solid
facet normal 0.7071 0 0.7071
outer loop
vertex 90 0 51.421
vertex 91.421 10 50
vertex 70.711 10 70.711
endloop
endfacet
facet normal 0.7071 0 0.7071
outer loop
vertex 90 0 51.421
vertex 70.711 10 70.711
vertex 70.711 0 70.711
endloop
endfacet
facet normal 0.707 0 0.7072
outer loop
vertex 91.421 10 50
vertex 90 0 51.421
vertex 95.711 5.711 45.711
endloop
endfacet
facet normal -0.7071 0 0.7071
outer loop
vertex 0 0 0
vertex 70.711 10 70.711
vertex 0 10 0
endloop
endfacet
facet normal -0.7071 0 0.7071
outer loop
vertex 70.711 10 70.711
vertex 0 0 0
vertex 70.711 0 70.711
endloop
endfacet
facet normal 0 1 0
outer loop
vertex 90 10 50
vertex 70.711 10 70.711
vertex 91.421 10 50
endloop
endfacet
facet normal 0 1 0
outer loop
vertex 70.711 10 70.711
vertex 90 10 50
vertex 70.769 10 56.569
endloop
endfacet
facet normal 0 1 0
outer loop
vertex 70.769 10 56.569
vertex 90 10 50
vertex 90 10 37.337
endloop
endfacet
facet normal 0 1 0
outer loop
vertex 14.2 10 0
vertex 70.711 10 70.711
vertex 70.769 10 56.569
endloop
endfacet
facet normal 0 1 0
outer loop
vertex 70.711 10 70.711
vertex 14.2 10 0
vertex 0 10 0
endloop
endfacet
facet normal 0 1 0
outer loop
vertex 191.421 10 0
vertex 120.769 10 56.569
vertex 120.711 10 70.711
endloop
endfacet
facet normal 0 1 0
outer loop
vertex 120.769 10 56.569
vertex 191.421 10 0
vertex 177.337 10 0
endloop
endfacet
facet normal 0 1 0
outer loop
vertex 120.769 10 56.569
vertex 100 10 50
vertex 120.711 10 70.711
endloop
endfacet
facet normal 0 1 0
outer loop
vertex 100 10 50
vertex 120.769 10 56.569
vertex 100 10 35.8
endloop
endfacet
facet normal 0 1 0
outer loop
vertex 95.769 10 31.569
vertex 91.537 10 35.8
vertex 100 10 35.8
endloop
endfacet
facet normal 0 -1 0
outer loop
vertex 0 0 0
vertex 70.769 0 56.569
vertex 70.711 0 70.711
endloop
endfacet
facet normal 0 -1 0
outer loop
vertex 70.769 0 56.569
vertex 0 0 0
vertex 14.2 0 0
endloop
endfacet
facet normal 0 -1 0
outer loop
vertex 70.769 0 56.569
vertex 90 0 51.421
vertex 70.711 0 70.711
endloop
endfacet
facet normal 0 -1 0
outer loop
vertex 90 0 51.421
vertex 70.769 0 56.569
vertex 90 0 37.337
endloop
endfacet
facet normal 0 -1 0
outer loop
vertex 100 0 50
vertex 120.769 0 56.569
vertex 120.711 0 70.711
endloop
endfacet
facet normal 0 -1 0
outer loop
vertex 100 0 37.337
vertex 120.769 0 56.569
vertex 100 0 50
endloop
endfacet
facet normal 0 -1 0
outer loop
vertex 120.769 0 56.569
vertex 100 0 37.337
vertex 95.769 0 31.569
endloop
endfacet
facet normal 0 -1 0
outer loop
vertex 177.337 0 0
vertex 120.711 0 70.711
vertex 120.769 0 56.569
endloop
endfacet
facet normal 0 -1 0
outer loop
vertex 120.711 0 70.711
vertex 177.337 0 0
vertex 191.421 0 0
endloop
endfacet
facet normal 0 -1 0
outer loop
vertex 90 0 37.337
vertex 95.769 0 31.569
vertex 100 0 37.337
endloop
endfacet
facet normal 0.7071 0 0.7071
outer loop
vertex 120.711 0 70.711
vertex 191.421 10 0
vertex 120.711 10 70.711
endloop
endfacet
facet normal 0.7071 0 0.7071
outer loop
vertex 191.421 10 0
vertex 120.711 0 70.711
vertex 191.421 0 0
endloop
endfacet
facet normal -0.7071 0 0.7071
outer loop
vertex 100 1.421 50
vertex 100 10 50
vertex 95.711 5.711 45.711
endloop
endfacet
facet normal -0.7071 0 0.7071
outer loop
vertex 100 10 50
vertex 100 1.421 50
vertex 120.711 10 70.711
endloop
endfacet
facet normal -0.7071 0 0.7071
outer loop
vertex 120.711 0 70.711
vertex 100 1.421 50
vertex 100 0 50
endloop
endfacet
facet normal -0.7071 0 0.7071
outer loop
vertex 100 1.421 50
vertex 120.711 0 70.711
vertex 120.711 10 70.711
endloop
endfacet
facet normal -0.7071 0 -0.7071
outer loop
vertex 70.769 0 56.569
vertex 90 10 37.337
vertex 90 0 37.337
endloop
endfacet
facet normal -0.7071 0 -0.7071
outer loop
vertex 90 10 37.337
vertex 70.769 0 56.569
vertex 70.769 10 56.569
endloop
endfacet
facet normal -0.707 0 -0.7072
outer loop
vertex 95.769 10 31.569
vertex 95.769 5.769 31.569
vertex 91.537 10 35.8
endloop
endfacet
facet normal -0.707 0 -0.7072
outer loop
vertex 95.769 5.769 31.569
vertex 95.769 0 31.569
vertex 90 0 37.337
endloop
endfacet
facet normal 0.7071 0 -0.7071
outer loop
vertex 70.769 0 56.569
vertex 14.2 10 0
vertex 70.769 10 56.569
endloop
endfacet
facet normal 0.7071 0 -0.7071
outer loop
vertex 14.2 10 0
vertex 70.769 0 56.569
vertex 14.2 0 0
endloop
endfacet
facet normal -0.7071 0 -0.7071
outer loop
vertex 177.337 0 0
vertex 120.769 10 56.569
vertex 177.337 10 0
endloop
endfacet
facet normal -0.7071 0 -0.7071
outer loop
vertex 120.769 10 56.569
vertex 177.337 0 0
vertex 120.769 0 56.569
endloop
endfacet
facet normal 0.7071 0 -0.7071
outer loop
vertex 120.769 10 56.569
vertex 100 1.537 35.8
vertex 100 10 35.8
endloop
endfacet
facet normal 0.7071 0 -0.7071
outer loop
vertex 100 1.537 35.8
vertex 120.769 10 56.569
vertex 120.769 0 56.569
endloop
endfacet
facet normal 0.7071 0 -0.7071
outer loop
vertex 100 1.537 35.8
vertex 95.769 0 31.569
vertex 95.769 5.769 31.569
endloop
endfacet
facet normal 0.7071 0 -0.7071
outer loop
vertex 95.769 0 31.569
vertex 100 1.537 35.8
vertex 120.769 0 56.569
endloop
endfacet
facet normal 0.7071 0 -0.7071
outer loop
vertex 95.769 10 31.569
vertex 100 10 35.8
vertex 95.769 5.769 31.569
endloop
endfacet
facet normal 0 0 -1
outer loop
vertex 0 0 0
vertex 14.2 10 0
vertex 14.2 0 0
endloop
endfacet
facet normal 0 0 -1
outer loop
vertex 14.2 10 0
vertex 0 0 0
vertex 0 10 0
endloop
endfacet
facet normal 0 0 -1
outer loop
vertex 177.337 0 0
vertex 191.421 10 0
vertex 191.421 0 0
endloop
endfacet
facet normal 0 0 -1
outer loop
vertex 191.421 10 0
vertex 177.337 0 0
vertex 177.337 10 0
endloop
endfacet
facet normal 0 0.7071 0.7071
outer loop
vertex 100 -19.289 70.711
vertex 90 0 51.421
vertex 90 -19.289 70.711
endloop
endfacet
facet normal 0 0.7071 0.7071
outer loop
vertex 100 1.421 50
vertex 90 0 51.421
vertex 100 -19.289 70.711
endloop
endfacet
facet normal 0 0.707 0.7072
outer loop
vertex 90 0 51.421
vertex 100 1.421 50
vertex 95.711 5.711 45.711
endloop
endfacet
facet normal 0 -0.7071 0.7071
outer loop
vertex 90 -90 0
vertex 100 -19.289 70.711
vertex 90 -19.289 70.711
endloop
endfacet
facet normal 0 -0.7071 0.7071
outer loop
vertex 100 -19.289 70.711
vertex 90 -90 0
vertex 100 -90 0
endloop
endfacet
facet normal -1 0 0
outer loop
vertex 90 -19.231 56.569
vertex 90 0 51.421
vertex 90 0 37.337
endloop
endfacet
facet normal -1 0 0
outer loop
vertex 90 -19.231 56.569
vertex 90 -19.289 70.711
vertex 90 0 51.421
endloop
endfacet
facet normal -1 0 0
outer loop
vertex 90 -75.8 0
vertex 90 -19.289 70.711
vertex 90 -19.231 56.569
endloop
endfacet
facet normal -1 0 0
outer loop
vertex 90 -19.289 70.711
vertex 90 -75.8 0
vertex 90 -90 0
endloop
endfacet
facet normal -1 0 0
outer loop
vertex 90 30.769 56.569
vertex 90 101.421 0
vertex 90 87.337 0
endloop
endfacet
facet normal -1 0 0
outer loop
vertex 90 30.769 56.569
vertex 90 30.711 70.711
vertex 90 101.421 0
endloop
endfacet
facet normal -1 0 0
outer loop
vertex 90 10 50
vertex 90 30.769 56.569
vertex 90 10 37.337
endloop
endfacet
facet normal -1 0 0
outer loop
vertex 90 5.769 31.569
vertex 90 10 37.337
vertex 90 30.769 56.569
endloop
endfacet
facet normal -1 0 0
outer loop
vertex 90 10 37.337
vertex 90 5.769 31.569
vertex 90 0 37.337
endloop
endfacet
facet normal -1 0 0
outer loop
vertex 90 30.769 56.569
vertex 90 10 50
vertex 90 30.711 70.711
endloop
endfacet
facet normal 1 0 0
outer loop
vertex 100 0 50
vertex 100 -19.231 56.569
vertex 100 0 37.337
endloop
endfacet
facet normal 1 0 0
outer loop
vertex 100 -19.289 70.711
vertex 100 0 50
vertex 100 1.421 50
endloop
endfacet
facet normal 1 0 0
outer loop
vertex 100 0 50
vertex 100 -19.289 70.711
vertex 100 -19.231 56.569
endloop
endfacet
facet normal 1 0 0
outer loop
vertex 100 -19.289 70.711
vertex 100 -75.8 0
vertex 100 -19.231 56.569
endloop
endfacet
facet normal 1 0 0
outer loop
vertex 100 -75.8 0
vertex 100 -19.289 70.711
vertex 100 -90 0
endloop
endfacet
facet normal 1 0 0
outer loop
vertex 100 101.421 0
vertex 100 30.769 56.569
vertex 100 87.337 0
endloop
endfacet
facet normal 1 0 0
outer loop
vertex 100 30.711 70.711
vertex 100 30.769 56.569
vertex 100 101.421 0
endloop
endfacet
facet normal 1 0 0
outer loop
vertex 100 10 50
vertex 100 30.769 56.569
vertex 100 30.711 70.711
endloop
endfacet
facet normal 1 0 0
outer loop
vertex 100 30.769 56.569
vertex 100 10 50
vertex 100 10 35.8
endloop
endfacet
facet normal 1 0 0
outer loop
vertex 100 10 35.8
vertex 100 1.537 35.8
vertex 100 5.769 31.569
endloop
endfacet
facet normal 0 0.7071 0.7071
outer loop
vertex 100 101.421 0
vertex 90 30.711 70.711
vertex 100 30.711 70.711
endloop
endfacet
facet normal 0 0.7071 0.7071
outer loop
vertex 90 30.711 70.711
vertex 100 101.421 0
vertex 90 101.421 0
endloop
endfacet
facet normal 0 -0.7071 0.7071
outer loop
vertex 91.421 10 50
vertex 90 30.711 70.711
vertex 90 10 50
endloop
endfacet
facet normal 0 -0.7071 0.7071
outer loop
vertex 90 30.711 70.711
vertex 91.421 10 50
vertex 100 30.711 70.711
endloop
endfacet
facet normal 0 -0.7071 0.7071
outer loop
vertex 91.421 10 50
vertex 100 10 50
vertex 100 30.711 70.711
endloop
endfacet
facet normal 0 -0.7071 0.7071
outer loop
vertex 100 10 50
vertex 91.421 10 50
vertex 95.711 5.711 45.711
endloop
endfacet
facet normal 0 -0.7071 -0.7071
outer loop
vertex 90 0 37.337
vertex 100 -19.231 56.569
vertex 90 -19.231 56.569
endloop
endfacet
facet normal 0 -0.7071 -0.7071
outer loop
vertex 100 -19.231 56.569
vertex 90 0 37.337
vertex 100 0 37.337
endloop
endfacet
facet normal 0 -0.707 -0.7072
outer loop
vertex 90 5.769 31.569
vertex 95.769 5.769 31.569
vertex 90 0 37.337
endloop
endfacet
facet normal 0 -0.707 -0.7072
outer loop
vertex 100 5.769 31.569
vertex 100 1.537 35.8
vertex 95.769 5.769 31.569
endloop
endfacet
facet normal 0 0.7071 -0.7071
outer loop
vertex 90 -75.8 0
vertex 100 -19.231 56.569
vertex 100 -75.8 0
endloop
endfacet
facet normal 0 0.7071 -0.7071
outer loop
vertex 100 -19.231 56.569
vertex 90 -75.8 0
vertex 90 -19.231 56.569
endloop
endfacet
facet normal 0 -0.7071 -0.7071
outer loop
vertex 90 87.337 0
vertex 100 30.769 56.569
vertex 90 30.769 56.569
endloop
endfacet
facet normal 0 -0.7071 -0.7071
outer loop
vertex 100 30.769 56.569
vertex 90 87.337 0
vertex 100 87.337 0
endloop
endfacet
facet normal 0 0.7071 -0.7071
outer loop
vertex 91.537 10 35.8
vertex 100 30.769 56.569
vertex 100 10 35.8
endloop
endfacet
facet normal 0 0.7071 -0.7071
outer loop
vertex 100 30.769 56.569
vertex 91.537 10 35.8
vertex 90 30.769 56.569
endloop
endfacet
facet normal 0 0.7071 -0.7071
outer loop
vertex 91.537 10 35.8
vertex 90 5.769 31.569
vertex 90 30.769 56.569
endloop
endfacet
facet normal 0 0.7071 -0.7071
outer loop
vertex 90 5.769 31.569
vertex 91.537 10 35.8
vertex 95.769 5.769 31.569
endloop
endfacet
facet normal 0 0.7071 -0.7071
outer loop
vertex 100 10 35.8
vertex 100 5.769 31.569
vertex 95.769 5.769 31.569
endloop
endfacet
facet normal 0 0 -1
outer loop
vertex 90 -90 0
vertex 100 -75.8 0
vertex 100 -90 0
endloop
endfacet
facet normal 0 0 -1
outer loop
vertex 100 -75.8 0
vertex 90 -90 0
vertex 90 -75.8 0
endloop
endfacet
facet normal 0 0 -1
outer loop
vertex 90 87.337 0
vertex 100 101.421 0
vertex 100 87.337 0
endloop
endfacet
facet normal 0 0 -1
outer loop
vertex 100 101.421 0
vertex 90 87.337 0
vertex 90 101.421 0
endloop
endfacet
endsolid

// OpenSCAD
module m() {
    difference() {
        union() {
            rotate([0,45,0]) cube([100,10,100]);
            translate([50,0,0]) rotate([0,45,0]) cube([100,10,100]);
        }
        union() {
            translate([14.2,0,0]) rotate([0,45,0]) cube([80,10,80]);
            translate([64.2,0,0]) rotate([0,45,0]) cube([80,10,80]);
            translate([0,0,-100]) cube([200,10,100]);
        }

    }
}

m();
translate([100,-90,0]) {
    rotate([0,0,90]) {
        m();
    }
}
